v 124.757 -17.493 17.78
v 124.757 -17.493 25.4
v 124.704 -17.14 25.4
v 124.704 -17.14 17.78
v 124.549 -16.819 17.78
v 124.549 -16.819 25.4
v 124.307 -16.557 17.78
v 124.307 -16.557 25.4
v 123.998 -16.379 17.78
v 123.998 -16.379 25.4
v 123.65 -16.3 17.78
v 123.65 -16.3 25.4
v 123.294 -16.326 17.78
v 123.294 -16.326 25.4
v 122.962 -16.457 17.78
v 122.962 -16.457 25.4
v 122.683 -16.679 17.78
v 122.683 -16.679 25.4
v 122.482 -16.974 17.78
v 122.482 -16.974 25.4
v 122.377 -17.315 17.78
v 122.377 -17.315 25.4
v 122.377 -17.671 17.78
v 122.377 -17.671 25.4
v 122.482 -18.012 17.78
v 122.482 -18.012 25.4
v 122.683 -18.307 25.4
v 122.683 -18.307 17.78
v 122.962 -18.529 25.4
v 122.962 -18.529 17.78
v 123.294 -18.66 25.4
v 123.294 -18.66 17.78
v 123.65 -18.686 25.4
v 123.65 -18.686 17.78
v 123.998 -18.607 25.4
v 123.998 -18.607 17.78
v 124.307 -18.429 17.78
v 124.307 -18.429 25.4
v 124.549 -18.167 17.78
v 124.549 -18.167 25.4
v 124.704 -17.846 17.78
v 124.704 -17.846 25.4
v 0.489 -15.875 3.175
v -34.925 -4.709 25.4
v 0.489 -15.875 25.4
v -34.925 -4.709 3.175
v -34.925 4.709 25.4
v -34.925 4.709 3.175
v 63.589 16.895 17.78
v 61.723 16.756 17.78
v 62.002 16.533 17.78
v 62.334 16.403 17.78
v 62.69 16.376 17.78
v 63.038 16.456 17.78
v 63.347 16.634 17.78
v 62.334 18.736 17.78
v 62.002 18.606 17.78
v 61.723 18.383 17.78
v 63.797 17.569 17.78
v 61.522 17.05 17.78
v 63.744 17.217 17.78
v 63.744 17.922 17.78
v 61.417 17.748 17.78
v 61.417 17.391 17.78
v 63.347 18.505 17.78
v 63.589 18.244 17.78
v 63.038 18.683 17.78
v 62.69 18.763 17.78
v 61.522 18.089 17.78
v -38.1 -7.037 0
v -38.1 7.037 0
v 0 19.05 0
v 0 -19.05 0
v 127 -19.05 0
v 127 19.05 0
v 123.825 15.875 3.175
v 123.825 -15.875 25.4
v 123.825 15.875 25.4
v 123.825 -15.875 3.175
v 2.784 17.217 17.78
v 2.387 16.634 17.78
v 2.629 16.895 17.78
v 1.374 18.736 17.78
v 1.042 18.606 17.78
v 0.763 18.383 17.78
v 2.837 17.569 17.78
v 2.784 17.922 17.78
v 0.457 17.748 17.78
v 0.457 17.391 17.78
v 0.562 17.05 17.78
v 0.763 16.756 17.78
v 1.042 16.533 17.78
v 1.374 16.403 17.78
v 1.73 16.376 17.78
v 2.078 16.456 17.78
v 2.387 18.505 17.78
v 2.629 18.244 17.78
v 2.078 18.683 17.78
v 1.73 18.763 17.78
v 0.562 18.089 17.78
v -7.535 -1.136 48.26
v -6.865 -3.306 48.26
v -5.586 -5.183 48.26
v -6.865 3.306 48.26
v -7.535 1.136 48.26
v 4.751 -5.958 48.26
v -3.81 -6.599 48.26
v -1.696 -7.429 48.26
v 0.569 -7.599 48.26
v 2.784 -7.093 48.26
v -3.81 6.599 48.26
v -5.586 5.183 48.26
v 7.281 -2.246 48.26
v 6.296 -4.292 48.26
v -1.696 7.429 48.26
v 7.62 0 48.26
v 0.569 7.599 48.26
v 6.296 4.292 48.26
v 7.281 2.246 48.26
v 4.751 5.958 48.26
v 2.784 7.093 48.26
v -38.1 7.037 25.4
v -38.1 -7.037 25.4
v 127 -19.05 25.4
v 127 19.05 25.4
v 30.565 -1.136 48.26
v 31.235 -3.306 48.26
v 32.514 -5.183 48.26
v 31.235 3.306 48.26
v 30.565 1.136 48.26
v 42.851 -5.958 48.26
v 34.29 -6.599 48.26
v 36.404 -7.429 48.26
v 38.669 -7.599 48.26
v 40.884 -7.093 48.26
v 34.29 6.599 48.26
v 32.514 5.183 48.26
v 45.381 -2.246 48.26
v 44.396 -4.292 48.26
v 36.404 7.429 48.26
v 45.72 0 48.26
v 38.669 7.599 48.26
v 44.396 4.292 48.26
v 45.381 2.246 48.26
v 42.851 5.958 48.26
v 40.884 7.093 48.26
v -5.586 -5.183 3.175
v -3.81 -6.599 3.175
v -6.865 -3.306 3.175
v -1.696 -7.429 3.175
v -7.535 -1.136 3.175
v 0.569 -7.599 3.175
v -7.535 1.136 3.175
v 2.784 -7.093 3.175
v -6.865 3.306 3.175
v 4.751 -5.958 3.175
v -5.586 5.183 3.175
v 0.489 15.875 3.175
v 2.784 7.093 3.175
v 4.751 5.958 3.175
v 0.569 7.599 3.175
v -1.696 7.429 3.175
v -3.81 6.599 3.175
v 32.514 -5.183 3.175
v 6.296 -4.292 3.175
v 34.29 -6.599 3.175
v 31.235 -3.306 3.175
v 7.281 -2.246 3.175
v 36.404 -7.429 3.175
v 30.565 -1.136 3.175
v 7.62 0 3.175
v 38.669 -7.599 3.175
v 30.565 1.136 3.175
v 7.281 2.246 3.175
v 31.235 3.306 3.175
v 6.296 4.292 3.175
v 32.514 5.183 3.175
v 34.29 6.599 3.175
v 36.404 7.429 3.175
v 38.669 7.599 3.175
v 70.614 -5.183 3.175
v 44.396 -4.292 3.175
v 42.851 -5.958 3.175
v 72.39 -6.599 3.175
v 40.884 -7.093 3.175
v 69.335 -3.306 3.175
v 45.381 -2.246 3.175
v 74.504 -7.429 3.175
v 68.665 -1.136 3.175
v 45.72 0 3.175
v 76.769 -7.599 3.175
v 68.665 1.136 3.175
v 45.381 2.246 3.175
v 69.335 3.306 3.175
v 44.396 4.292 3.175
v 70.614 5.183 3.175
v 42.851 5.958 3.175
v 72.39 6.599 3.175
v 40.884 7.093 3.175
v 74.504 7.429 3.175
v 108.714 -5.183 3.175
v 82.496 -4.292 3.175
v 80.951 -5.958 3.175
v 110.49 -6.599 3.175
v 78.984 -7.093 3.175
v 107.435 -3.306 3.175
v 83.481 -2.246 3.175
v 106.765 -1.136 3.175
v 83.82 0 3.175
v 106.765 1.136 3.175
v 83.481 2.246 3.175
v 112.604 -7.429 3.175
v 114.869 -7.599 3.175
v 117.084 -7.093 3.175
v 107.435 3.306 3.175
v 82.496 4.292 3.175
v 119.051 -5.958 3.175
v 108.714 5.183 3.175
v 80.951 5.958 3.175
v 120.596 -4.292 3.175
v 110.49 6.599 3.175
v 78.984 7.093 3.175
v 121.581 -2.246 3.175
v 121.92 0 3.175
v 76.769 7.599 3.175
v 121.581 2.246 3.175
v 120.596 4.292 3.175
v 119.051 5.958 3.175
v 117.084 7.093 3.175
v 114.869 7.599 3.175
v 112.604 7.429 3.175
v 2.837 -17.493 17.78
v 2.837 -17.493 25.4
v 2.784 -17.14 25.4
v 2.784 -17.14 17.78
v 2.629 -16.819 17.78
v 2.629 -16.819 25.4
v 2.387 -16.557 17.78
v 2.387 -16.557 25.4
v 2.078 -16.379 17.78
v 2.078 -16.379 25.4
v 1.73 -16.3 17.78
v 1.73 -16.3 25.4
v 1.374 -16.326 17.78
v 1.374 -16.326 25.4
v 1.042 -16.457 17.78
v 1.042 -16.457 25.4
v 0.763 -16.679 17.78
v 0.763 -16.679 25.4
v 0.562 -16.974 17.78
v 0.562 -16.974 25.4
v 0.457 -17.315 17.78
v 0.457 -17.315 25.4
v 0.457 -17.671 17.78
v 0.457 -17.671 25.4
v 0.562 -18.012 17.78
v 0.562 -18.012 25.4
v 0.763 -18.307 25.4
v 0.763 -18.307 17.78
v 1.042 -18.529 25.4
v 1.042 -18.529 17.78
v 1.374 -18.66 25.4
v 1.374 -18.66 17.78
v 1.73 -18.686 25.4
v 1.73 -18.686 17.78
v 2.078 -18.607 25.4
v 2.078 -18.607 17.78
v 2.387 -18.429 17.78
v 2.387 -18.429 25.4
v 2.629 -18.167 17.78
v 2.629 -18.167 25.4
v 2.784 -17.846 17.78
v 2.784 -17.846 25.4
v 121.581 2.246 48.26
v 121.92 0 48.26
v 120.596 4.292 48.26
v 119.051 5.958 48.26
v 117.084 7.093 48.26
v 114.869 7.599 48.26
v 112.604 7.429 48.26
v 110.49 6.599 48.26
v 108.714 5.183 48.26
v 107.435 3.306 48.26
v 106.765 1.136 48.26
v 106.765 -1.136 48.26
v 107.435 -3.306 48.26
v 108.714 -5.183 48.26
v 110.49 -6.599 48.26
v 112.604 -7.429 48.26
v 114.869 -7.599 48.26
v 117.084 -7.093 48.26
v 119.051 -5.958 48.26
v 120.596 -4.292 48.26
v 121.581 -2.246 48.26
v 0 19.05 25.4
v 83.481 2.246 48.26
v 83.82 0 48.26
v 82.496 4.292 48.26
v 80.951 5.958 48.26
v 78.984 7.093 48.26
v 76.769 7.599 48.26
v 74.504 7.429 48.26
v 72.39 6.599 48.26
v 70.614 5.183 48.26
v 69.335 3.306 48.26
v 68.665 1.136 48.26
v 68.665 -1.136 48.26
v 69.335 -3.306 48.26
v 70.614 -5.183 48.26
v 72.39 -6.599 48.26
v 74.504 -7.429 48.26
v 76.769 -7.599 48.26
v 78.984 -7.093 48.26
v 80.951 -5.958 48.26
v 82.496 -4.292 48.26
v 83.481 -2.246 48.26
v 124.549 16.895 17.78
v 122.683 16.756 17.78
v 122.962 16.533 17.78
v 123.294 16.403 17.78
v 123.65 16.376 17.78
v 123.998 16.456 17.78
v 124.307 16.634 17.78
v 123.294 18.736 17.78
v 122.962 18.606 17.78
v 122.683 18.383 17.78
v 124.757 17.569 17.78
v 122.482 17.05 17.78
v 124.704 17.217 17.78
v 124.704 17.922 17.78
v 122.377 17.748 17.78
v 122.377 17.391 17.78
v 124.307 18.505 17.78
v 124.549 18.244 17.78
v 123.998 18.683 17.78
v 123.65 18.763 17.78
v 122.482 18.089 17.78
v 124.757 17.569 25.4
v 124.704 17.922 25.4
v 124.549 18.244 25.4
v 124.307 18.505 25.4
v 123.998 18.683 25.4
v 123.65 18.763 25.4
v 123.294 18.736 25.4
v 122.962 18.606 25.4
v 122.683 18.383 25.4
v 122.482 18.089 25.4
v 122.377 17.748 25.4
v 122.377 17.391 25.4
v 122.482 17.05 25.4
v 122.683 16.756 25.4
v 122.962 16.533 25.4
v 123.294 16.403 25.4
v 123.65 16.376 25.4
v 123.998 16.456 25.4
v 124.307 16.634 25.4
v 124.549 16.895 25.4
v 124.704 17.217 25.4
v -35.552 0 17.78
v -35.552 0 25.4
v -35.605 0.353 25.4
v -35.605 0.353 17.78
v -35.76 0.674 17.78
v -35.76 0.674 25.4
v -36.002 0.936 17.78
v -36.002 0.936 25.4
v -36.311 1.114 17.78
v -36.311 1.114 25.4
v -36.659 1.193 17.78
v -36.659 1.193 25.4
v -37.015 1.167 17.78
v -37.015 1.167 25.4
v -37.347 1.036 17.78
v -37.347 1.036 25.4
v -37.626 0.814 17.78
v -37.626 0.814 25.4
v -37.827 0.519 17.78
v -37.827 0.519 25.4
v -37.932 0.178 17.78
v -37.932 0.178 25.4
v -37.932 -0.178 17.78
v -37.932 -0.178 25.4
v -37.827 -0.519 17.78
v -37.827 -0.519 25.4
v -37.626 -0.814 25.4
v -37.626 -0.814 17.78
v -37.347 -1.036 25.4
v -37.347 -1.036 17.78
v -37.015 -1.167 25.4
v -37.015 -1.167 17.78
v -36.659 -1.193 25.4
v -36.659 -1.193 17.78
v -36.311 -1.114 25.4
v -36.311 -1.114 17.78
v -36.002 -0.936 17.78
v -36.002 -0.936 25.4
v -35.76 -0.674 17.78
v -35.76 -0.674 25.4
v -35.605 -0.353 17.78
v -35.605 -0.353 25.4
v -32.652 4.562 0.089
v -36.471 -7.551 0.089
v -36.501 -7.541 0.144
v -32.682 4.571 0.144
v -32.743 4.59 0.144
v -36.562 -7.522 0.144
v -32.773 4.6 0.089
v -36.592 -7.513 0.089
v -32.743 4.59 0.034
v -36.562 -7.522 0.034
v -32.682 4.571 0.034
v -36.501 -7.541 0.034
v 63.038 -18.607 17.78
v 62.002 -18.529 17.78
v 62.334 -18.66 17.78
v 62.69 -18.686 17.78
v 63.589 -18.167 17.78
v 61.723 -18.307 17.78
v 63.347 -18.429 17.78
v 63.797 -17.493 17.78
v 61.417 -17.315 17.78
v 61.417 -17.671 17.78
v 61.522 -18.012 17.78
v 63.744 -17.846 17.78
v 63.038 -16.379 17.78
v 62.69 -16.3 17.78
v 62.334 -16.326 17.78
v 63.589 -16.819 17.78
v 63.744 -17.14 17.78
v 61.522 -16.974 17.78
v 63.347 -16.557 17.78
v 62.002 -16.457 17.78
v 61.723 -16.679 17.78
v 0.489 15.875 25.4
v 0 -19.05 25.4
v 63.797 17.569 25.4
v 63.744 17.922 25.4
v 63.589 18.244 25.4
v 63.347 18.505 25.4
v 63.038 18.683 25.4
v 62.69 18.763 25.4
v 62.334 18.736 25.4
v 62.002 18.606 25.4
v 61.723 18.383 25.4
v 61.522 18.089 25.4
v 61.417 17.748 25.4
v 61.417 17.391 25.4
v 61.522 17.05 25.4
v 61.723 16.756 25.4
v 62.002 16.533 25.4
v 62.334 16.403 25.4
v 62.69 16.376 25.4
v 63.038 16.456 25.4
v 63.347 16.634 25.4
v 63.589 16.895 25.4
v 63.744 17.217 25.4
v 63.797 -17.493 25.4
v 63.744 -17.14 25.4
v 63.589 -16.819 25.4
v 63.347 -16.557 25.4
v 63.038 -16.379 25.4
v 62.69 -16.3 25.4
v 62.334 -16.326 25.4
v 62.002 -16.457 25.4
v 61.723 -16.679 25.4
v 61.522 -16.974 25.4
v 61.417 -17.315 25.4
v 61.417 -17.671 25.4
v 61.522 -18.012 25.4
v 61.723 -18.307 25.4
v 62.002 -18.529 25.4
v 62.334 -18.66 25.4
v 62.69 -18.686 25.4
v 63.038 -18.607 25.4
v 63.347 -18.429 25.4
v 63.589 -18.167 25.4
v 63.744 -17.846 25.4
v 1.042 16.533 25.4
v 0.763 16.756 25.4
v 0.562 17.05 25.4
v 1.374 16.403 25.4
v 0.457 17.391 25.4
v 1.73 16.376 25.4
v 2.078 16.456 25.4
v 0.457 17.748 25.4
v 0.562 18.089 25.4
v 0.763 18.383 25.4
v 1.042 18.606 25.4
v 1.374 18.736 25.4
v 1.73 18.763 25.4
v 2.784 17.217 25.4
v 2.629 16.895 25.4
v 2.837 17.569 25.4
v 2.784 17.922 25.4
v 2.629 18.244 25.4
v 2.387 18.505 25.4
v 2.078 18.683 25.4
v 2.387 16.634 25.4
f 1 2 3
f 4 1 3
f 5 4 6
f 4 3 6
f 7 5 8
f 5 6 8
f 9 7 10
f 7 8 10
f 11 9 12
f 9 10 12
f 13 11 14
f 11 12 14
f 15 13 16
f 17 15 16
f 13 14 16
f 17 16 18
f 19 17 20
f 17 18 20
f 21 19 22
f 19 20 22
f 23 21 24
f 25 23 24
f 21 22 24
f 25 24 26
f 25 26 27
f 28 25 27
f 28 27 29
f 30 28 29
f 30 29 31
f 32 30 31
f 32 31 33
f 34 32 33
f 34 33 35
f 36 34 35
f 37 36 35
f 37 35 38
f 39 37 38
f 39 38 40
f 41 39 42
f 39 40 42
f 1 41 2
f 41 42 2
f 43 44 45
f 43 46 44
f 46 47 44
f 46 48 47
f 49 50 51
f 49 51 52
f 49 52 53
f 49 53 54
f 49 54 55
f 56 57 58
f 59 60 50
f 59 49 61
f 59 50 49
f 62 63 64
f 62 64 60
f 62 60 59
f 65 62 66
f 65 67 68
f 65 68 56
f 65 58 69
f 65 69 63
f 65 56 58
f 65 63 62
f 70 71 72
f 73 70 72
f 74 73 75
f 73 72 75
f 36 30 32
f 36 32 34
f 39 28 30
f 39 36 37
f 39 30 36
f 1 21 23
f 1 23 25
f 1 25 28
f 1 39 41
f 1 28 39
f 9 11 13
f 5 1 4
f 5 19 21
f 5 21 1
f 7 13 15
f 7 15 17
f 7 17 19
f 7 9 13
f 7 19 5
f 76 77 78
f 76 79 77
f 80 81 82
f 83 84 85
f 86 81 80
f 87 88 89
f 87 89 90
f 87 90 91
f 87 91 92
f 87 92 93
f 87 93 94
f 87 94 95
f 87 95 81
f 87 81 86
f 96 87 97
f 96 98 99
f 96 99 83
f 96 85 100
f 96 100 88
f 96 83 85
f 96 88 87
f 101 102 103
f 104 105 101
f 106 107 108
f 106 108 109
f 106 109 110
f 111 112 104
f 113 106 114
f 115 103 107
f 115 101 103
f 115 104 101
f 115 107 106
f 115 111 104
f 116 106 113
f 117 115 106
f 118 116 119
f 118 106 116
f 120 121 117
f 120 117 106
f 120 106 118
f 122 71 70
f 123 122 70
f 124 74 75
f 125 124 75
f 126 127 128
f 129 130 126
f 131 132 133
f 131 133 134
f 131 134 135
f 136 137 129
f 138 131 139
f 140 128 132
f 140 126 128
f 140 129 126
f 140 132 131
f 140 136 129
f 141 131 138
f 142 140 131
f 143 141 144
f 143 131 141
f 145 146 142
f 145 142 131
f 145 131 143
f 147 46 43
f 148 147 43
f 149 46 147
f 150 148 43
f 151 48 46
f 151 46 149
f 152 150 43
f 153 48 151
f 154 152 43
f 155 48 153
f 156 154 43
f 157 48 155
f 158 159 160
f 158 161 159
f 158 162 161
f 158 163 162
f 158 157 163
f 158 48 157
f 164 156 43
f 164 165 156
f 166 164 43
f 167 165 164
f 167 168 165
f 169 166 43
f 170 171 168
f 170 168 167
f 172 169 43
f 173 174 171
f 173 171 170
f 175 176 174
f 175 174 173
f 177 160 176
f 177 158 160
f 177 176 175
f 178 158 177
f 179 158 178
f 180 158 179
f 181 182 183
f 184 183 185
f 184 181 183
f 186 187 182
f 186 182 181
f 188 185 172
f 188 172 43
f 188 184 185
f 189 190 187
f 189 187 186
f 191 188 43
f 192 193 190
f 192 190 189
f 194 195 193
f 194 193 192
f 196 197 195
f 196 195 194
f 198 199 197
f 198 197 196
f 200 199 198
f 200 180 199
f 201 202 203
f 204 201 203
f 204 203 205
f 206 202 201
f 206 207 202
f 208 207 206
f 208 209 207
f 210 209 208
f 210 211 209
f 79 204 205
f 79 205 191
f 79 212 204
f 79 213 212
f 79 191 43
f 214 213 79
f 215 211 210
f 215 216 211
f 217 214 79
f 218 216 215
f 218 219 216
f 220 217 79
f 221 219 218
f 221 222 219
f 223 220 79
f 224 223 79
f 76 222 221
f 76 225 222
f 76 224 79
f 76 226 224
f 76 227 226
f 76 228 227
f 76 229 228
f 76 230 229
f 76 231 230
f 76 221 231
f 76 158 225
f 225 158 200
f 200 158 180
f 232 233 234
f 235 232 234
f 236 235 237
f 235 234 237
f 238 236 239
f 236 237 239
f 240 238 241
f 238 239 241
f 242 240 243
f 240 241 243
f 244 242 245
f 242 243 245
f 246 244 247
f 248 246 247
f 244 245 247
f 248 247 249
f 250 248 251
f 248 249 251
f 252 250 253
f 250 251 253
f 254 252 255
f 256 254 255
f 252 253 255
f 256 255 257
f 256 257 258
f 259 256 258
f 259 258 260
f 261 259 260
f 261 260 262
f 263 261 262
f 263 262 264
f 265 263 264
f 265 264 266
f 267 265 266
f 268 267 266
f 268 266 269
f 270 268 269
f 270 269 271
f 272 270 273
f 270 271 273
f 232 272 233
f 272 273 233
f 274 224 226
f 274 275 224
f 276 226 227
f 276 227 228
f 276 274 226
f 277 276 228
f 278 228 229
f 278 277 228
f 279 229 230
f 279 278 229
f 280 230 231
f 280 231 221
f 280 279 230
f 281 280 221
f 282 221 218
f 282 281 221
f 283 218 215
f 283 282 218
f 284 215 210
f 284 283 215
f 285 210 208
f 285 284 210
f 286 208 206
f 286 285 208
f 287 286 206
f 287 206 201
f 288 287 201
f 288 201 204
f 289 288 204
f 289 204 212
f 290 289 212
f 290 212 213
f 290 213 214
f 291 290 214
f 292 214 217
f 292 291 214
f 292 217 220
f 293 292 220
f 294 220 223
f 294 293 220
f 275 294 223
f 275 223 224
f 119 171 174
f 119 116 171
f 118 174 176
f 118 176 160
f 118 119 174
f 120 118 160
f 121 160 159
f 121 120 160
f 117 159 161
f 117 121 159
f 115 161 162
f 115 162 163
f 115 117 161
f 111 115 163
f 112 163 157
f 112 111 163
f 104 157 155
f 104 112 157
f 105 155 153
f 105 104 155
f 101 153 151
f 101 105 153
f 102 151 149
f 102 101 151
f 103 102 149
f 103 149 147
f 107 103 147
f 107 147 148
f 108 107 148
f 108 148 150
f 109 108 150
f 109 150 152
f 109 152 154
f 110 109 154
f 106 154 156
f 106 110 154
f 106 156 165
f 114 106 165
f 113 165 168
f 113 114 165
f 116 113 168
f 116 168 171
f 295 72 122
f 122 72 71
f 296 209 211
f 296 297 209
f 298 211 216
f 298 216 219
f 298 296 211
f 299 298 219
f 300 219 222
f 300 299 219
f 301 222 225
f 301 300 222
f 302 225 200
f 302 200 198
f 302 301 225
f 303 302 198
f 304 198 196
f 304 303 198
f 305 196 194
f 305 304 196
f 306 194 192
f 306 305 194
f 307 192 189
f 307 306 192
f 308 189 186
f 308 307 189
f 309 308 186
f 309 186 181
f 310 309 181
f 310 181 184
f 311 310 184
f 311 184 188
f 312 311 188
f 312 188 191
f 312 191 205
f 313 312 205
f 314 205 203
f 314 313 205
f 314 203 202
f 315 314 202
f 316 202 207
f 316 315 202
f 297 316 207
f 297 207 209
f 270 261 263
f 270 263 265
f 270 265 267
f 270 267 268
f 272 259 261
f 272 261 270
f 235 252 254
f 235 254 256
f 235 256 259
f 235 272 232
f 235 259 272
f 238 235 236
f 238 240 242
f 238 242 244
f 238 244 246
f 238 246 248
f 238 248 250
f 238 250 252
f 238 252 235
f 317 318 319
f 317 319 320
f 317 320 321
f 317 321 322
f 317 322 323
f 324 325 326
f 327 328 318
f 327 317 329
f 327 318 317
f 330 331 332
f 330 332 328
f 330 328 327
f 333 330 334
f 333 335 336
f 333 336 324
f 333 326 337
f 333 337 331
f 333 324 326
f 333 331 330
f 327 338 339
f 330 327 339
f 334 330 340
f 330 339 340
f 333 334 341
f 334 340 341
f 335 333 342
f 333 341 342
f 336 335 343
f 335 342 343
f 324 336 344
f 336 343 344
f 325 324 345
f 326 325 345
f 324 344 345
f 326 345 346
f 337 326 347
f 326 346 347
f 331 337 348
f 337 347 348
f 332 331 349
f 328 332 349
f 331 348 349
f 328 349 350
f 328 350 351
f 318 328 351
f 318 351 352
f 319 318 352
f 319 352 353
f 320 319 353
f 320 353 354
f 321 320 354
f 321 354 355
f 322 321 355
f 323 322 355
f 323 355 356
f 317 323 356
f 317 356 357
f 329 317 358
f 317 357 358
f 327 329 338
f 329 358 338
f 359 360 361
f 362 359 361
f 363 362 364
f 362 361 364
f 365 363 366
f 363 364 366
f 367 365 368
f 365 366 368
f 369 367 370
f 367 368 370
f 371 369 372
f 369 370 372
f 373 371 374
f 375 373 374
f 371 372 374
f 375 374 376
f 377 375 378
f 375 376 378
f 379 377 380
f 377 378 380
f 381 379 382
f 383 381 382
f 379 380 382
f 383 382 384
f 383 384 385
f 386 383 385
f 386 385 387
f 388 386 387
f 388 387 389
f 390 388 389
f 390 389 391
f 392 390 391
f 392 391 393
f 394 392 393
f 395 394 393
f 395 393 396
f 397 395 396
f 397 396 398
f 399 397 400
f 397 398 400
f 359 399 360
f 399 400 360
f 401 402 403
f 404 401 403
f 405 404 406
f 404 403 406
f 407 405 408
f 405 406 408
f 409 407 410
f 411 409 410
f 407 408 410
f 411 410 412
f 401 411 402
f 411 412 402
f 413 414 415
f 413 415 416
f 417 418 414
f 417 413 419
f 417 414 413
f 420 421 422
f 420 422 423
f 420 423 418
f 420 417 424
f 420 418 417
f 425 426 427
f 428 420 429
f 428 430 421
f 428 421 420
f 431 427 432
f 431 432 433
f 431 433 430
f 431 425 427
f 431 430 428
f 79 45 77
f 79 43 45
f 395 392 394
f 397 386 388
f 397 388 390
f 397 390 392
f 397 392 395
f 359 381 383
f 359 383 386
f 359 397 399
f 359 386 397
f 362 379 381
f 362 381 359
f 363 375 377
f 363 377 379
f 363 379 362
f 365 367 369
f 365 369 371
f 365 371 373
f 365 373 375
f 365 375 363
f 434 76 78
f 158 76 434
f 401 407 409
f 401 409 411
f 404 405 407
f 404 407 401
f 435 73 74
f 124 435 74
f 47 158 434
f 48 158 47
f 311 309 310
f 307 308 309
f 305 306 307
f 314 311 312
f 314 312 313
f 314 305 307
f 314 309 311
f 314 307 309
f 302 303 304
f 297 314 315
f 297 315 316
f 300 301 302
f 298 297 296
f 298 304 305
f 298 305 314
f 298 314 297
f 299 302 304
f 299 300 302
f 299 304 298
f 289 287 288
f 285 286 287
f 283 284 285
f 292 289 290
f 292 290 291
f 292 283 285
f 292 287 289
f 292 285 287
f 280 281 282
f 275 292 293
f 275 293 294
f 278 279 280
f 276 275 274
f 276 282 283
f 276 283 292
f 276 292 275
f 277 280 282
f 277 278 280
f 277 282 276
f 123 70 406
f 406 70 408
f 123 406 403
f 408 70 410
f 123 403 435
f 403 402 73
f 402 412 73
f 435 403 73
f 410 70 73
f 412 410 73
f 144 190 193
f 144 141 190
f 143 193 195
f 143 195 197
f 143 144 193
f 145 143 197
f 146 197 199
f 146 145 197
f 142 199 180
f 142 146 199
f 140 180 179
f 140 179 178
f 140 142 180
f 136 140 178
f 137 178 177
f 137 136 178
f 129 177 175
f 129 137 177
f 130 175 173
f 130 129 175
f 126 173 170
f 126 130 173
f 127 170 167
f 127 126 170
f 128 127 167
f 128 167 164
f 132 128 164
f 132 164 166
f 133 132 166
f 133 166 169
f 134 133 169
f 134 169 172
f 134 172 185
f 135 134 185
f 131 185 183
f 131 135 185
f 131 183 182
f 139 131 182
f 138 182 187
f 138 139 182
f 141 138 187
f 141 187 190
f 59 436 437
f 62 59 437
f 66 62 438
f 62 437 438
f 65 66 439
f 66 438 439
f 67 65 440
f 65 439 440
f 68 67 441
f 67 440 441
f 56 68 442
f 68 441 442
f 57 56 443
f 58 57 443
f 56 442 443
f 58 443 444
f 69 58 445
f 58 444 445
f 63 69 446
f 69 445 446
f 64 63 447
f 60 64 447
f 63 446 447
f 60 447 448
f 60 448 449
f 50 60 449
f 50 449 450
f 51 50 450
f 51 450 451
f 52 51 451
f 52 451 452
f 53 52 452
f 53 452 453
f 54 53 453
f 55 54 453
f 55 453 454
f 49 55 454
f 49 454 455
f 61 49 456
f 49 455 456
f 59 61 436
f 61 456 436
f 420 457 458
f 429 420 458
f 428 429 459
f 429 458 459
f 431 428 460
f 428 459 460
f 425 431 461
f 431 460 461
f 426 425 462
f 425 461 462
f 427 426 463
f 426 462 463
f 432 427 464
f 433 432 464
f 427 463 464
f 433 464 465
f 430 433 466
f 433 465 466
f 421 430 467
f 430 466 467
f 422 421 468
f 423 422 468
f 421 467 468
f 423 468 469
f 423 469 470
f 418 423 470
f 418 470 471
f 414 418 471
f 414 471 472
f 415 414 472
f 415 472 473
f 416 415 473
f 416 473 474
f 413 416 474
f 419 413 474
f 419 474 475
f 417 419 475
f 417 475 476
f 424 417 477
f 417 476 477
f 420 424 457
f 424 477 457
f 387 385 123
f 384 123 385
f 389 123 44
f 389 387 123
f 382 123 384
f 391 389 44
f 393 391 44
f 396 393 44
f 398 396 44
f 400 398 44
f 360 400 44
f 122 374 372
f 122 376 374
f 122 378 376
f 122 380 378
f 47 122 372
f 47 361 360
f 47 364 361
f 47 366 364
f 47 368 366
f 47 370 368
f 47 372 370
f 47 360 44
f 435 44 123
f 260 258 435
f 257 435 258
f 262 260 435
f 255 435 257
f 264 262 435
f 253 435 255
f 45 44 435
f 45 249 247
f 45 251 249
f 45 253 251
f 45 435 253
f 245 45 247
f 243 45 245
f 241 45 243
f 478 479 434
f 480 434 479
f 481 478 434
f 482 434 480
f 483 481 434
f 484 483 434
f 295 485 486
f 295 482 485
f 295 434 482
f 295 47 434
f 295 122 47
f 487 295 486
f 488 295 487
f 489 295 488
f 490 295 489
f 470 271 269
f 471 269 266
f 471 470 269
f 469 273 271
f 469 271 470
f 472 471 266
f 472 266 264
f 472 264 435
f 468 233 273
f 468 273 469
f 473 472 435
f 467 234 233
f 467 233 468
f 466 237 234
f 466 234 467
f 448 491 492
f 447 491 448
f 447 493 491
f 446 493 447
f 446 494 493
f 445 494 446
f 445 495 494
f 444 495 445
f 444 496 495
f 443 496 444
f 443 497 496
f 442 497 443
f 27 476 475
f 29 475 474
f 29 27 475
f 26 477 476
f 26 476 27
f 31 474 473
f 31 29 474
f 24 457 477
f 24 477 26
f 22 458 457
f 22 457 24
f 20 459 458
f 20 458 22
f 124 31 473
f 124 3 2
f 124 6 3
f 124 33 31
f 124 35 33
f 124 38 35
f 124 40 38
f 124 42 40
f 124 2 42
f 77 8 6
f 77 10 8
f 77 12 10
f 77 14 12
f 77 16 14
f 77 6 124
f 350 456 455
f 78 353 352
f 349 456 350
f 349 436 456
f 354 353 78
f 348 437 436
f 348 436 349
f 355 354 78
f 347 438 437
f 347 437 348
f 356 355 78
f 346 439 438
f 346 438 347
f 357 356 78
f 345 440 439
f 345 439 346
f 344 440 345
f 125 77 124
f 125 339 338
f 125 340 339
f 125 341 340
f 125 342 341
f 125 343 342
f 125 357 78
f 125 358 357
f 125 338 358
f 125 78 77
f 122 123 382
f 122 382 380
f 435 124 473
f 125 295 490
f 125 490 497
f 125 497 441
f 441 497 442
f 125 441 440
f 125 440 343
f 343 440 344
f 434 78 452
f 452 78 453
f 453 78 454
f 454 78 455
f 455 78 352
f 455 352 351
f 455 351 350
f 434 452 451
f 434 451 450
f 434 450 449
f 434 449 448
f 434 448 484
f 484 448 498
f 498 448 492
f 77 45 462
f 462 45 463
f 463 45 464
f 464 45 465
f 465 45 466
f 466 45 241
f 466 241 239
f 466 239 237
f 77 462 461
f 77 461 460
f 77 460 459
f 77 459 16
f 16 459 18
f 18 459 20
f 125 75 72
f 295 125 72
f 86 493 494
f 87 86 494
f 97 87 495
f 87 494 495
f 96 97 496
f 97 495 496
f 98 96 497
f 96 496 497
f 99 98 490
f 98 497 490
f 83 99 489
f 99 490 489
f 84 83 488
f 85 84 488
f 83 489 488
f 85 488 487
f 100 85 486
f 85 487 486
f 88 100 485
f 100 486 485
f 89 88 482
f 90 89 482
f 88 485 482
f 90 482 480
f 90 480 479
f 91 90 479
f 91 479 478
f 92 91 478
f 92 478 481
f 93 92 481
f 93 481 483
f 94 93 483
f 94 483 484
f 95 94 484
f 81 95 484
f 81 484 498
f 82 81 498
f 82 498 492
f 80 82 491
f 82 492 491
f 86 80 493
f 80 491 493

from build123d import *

# Parameters (mm, degrees)
F1_DEPTH      = 25.4
F3_T          = -3.175
F2_R          = 7.62
F4_DEPTH      = 22.86
F4_DEPTH_BACK = 22.225
F5_R          = 1.1967045105
F6_DEPTH      = 7.62
F7_R          = 0.0635
F8_DEPTH      = 12.7


# Not quite as in the source:
# - a feature names something its author has since deleted; it is built from what else it names


with BuildPart() as f1:
    # F0 (on Top) → F1 (new body)
    with BuildSketch(Plane.XY):
        Polygon((-38.1, 7.0371161437), (-38.1, -7.0371161437), (0, -19.05), (127, -19.05), (127, 19.05), (0, 19.05), align=None)
    extrude(amount=F1_DEPTH)

    # F3
    f3_openings = [f1.faces().sort_by_distance(p)[0] for p in [
        (49.931192, 0, 25.4),
    ]]
    offset(amount=F3_T, openings=f3_openings)

    # F2 (on face) → F4 (join, two sides)
    with BuildSketch(Plane.XY.offset(25.4)) as f4_sk:
        Circle(F2_R)
        with Locations((38.1, 0)):
            Circle(F2_R)
        with Locations((76.2, 0)):
            Circle(F2_R)
        with Locations((114.3, 0)):
            Circle(F2_R)
    extrude(amount=F4_DEPTH)
    extrude(f4_sk.sketch, amount=-F4_DEPTH_BACK)

    # F5 (on face) → F6 (cut)
    with BuildSketch(Plane.XY.offset(25.4)):
        with Locations((1.6406770326, 17.5694916397)):
            Circle(F5_R)
        with Locations((62.6006770326, 17.5694916397)):
            Circle(F5_R)
        with Locations((123.5606770326, 17.5694916397)):
            Circle(F5_R)
        with Locations((-36.748547107, 0)):
            Circle(F5_R)
        with Locations((62.6006770326, -17.4930030425)):
            Circle(F5_R)
        with Locations((123.5606770326, -17.4930030425)):
            Circle(F5_R)
        with Locations((1.6406770326, -17.4930030425)):
            Circle(F5_R)
    extrude(amount=-F6_DEPTH, mode=Mode.SUBTRACT)

    # F7 (on face) → F8 (cut)
    with BuildSketch(Plane(origin=(-5.4633155562, -17.3274232219, 0), x_dir=(0.9537169507, -0.3007057995, 0), z_dir=(-0.3007057995, -0.9537169507, 0))):
        with Locations((-32.5760804117, 0.0889)):
            Circle(F7_R)
    extrude(amount=-F8_DEPTH, mode=Mode.SUBTRACT)


solid = f1.part
